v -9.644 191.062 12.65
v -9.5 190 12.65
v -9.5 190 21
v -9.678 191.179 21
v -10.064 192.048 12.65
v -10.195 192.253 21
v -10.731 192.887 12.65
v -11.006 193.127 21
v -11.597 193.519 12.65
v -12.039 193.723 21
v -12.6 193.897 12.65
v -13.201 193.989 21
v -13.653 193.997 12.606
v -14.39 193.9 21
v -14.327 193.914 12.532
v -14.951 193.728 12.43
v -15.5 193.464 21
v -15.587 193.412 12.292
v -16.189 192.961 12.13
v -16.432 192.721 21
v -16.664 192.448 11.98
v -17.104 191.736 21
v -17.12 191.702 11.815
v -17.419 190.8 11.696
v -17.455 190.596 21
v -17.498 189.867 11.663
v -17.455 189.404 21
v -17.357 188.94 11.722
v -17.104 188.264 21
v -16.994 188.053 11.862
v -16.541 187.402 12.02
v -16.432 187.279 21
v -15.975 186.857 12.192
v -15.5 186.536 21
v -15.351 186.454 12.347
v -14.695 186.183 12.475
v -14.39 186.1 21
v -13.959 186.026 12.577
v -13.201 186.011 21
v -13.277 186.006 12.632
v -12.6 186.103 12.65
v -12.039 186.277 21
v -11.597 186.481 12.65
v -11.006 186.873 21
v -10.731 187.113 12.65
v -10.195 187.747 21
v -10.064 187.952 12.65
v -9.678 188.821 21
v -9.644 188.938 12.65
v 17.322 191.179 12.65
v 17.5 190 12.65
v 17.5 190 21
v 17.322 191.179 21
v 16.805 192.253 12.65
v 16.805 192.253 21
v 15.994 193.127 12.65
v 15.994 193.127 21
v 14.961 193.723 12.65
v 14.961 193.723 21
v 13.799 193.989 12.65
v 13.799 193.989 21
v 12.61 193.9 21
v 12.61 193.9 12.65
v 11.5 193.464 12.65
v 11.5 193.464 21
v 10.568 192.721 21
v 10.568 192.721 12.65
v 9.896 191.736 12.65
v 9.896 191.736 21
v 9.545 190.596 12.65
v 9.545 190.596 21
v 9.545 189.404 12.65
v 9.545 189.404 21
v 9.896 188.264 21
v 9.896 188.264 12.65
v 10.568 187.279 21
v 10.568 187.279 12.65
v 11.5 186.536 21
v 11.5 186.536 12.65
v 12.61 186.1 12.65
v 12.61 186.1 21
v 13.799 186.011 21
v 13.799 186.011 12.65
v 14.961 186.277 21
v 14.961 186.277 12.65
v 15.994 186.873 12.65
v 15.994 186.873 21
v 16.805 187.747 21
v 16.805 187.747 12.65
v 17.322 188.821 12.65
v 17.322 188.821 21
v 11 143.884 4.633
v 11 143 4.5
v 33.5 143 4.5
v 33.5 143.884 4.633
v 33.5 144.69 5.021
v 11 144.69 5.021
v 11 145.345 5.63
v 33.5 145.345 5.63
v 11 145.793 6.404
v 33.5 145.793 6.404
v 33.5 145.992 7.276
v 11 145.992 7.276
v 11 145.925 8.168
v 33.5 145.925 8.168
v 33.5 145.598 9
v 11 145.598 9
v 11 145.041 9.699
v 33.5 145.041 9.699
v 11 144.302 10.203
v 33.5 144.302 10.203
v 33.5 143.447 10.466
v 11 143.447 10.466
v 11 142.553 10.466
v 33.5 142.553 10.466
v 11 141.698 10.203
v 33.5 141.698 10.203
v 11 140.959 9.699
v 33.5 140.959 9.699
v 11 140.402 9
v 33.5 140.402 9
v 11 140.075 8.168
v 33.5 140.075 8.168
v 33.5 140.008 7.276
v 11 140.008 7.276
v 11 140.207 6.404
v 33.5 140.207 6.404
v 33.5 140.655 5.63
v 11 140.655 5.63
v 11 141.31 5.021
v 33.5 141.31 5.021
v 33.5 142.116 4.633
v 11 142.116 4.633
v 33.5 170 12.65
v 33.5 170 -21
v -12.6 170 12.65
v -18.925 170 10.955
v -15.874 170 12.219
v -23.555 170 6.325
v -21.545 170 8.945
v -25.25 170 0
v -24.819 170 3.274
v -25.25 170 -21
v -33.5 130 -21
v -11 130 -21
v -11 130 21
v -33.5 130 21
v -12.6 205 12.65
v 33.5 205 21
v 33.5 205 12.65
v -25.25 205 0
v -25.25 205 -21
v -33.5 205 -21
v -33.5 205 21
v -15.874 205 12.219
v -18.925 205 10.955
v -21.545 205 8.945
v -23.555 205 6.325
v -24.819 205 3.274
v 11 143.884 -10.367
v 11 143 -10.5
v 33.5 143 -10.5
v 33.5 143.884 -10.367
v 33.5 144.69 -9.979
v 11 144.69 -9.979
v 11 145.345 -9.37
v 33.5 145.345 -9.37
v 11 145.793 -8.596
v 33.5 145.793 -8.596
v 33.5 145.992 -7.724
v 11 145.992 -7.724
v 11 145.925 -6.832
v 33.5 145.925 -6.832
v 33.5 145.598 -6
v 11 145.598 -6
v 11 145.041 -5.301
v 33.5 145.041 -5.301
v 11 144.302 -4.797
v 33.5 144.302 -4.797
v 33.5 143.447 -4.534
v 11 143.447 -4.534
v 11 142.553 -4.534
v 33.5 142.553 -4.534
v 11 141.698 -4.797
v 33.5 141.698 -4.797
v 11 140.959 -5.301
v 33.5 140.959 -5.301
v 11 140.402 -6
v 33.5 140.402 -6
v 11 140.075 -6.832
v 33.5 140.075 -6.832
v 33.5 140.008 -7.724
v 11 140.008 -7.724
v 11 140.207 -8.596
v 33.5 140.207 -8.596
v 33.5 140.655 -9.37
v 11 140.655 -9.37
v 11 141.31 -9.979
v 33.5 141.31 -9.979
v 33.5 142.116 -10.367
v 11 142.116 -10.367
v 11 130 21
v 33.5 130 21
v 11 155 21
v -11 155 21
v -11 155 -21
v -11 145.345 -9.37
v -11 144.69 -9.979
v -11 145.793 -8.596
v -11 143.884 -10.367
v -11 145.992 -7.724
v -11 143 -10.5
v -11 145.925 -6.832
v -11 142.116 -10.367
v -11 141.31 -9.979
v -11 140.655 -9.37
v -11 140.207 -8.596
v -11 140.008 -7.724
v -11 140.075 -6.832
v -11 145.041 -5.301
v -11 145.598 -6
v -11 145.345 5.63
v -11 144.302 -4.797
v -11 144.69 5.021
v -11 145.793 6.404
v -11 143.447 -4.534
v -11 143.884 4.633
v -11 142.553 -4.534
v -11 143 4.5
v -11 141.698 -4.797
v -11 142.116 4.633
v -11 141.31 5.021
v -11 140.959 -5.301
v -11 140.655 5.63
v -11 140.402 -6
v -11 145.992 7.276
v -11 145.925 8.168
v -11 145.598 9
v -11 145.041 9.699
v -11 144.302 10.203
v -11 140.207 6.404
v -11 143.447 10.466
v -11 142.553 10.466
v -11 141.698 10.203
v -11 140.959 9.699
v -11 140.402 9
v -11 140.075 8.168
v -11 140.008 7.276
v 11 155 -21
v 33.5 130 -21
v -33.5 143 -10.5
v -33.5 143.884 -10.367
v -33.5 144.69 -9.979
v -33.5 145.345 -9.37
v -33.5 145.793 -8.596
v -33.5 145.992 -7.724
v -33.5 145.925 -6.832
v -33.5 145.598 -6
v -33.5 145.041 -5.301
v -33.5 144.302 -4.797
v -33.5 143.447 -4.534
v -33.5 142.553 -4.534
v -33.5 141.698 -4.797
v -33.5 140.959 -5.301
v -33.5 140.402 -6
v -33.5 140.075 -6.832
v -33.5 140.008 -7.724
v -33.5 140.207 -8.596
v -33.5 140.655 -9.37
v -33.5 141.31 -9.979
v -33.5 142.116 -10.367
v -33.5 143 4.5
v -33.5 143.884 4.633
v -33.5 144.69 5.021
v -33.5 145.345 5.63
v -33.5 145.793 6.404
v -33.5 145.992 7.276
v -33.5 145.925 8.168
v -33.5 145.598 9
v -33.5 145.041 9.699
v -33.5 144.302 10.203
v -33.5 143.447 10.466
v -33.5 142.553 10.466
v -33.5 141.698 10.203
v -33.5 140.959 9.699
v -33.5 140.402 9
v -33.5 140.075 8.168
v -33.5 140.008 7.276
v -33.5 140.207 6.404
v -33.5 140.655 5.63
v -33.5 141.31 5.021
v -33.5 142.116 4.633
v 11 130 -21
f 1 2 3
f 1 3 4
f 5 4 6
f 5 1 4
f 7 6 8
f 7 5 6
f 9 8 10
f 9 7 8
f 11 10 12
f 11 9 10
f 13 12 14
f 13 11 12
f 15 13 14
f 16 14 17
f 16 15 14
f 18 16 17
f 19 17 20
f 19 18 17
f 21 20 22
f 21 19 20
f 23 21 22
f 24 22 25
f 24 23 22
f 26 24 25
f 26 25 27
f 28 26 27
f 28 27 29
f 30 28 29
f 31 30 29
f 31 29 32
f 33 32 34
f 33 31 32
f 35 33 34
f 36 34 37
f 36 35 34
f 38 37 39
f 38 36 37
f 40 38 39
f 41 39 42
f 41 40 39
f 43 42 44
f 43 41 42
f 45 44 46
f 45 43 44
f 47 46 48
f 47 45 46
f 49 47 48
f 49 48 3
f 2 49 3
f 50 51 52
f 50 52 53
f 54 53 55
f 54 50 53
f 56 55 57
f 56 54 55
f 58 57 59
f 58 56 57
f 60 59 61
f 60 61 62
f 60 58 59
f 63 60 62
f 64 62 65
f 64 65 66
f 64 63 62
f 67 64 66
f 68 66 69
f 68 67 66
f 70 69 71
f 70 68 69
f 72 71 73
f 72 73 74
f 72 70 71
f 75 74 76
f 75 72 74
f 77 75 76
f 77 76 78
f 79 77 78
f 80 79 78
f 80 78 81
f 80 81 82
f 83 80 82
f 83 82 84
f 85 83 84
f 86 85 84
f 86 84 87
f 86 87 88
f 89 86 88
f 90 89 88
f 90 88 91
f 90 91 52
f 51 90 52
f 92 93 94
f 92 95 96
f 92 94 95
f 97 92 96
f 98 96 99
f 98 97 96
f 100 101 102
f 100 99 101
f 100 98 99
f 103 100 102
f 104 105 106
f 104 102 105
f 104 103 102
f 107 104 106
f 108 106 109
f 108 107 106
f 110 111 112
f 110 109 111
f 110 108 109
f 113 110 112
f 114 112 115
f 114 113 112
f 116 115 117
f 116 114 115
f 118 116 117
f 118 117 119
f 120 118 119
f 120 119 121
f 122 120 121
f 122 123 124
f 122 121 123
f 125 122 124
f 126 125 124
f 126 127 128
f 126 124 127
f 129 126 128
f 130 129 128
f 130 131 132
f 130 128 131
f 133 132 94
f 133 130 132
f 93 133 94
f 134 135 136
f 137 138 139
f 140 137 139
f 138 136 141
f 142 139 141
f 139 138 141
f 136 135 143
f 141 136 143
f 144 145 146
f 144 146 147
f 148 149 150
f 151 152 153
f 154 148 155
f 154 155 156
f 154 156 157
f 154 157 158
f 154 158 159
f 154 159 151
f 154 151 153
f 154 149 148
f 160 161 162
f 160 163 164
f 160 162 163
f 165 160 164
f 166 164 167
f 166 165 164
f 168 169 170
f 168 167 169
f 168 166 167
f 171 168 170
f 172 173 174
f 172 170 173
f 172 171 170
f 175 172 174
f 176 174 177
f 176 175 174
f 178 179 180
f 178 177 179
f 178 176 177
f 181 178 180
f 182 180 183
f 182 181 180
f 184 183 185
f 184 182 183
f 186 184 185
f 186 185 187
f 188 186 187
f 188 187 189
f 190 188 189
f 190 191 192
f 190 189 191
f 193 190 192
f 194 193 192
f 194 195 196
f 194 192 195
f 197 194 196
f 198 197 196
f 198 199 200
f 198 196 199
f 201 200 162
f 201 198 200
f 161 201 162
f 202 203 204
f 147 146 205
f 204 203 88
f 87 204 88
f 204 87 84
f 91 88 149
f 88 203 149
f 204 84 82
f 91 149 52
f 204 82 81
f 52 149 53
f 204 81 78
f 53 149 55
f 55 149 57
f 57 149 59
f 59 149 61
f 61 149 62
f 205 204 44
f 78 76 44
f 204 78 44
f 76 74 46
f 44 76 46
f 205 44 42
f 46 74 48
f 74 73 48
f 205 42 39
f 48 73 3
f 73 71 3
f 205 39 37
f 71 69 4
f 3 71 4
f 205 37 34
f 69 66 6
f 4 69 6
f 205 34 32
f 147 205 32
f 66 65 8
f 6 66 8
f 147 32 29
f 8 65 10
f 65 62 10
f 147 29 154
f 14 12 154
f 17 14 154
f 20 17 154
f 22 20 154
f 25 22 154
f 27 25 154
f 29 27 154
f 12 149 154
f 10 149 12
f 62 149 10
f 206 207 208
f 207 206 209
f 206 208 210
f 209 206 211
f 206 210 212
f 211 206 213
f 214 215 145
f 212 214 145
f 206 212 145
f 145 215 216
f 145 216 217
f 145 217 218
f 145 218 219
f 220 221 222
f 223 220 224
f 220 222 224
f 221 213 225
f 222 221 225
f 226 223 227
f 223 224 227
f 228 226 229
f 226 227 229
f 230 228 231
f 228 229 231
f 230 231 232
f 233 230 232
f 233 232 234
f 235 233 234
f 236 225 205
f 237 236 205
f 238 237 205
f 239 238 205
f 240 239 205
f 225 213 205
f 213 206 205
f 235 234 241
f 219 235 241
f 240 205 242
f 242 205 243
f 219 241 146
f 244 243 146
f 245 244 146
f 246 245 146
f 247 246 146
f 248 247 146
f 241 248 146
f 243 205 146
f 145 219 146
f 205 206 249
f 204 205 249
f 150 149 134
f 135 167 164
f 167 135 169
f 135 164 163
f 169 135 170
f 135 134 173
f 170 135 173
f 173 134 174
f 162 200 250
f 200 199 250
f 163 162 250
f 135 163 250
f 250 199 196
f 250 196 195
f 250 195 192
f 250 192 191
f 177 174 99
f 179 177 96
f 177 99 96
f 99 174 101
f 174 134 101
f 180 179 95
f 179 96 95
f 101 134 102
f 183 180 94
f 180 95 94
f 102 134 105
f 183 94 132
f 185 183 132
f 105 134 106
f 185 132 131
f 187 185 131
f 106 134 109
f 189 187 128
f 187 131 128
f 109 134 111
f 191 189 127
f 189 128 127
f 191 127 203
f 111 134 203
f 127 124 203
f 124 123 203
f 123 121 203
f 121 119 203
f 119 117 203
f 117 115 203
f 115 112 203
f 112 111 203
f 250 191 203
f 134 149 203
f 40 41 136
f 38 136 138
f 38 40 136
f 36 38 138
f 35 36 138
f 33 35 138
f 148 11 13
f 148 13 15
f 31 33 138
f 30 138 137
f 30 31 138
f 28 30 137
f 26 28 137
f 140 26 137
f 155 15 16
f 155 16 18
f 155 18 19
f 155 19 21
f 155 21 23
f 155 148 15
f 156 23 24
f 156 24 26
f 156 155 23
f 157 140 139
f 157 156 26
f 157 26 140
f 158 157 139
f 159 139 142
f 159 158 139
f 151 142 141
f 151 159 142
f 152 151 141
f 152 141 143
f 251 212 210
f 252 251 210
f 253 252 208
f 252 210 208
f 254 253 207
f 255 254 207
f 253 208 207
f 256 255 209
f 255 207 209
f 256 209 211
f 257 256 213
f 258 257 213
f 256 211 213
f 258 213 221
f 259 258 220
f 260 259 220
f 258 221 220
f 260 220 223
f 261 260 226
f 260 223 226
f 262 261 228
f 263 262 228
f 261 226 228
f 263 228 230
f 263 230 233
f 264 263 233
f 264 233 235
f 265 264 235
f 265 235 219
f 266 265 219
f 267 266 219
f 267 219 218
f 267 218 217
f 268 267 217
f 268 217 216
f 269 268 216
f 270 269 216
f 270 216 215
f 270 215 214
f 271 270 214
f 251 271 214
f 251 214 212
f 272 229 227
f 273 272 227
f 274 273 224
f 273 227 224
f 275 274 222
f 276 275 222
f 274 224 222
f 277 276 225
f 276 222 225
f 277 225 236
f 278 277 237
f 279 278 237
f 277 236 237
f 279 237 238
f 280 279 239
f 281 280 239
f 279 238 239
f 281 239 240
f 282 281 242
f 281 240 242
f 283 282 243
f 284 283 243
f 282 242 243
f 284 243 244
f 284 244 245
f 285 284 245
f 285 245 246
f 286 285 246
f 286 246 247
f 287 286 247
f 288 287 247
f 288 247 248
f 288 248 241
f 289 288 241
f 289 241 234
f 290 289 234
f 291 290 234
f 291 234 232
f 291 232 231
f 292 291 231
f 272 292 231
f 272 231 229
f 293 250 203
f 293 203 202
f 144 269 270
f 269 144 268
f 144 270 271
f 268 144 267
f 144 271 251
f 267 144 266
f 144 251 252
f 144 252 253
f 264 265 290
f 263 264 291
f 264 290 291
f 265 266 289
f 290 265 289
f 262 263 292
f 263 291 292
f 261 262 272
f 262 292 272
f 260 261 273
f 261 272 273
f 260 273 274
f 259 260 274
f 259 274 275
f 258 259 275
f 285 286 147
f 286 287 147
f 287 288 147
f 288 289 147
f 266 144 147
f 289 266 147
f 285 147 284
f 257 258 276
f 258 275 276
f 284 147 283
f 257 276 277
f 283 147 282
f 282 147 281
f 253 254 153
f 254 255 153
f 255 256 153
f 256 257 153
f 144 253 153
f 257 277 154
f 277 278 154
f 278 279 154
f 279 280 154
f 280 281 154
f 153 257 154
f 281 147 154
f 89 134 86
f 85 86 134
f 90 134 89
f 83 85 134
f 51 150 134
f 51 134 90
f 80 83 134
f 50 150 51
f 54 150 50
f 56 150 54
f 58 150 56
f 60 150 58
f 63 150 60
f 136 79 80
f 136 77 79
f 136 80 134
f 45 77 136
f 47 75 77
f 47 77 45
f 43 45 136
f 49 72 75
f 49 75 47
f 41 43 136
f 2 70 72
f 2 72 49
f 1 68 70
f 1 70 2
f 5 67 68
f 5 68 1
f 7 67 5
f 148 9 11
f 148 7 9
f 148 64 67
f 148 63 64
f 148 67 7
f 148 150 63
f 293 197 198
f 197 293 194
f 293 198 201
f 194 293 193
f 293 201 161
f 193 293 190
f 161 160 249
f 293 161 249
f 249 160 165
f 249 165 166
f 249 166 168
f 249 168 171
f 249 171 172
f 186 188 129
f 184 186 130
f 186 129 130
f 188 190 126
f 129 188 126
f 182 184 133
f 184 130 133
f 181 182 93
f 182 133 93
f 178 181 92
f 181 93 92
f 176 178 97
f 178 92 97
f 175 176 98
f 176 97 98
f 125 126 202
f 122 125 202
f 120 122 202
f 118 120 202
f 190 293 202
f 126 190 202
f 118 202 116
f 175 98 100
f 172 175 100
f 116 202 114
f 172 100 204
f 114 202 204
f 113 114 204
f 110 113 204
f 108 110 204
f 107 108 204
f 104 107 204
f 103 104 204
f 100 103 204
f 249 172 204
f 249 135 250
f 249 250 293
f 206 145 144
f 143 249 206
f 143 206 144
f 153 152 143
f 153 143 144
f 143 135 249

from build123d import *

# Parameters (mm, degrees)
AUFSATZ_LINEAR_AUSTRAGEN1_DEPTH             = 21
AUFSATZ_LINEAR_AUSTRAGEN1_DEPTH_BACK        = 21
SCHNITT_LINEAR_AUSTRAGEN1_DEPTH             = 35
SKIZZE9_R                                   = 4
SCHNITT_LINEAR_AUSTRAGEN2_DEPTH             = 21
SCHNITT_LINEAR_AUSTRAGEN3_REACH             = 35.5
SKIZZE11_R                                  = 3
SCHNITT_LINEAR_AUSTRAGEN3_DIRECTION_2_REACH = 35.5


with BuildPart() as part:
    # Skizze3 → Aufsatz-Linear austragen1 (new body, two sides)
    with BuildSketch(Plane.XY) as aufsatz_linear_austragen1_sk:
        Polygon((0, 205), (33.5, 205), (33.5, 130), (11, 130), (11, 155), (0, 155), (-11, 155), (-11, 130), (-33.5, 130), (-33.5, 205), align=None)
    extrude(amount=AUFSATZ_LINEAR_AUSTRAGEN1_DEPTH)
    extrude(aufsatz_linear_austragen1_sk.sketch, amount=-AUFSATZ_LINEAR_AUSTRAGEN1_DEPTH_BACK)

    # Skizze6 → Schnitt-Linear austragen1 (cut)
    with BuildSketch(Plane(origin=(0, 205, 0), x_dir=(1, 0, 0), z_dir=(0, 1, 0))):
        with BuildLine():
            Line((-25.25, 0), (-25.25, 21))
            Line((-25.25, 21), (33.5, 21))
            Line((33.5, 21), (33.5, -12.65))
            Line((33.5, -12.65), (-12.6, -12.65))
            ThreePointArc((-12.6, -12.65), (-21.544900782, -8.944900782), (-25.25, 0))
        make_face()
    extrude(amount=-SCHNITT_LINEAR_AUSTRAGEN1_DEPTH, mode=Mode.SUBTRACT)

    # Skizze9 → Schnitt-Linear austragen2 (cut)
    with BuildSketch(Plane.XY):
        with Locations((-13.5, 190)):
            Circle(SKIZZE9_R)
        with Locations((13.5, 190)):
            Circle(SKIZZE9_R)
    extrude(amount=SCHNITT_LINEAR_AUSTRAGEN2_DEPTH, mode=Mode.SUBTRACT)

    # Schnitt-Linear austragen3: up to this face of the body (flat: up to its plane)
    schnitt_linear_austragen3_end = Plane(part.part.faces().sort_by_distance((-33.5, 167.5, 0))[0])
    # Skizze11 → Schnitt-Linear austragen3 (cut, up to the picked face)
    with BuildSketch(Plane(origin=(0, 0, 0), x_dir=(0, 0, -1), z_dir=(1, 0, 0)), mode=Mode.PRIVATE) as schnitt_linear_austragen3_sk1:
        with Locations((7.5, 143)):
            Circle(SKIZZE11_R)
    schnitt_linear_austragen3_tool1 = split(extrude(schnitt_linear_austragen3_sk1.sketch, amount=-SCHNITT_LINEAR_AUSTRAGEN3_REACH, mode=Mode.PRIVATE), bisect_by=schnitt_linear_austragen3_end, keep=Keep.BOTH, mode=Mode.PRIVATE)
    add(schnitt_linear_austragen3_tool1.solids().sort_by_distance((0, 143, -7.5))[0], mode=Mode.SUBTRACT)
    # Skizze11 → Schnitt-Linear austragen3 (cut, up to the picked face)
    with BuildSketch(Plane(origin=(0, 0, 0), x_dir=(0, 0, -1), z_dir=(1, 0, 0)), mode=Mode.PRIVATE) as schnitt_linear_austragen3_sk2:
        with Locations((-7.5, 143)):
            Circle(SKIZZE11_R)
    schnitt_linear_austragen3_tool2 = split(extrude(schnitt_linear_austragen3_sk2.sketch, amount=-SCHNITT_LINEAR_AUSTRAGEN3_REACH, mode=Mode.PRIVATE), bisect_by=schnitt_linear_austragen3_end, keep=Keep.BOTH, mode=Mode.PRIVATE)
    add(schnitt_linear_austragen3_tool2.solids().sort_by_distance((0, 143, 7.5))[0], mode=Mode.SUBTRACT)

    # Schnitt-Linear austragen3 direction 2: up to this face of the body (flat: up to its plane)
    schnitt_linear_austragen3_direction_2_end = Plane(part.part.faces().sort_by_distance((33.5, 155.556787933, 2.493145519))[0])
    # Skizze11 → Schnitt-Linear austragen3 direction 2 (cut, up to the picked face)
    with BuildSketch(Plane(origin=(0, 0, 0), x_dir=(0, 0, -1), z_dir=(1, 0, 0)), mode=Mode.PRIVATE) as schnitt_linear_austragen3_direction_2_sk1:
        with Locations((7.5, 143)):
            Circle(SKIZZE11_R)
    schnitt_linear_austragen3_direction_2_tool1 = split(extrude(schnitt_linear_austragen3_direction_2_sk1.sketch, amount=SCHNITT_LINEAR_AUSTRAGEN3_DIRECTION_2_REACH, mode=Mode.PRIVATE), bisect_by=schnitt_linear_austragen3_direction_2_end, keep=Keep.BOTH, mode=Mode.PRIVATE)
    add(schnitt_linear_austragen3_direction_2_tool1.solids().sort_by_distance((0, 143, -7.5))[0], mode=Mode.SUBTRACT)
    # Skizze11 → Schnitt-Linear austragen3 direction 2 (cut, up to the picked face)
    with BuildSketch(Plane(origin=(0, 0, 0), x_dir=(0, 0, -1), z_dir=(1, 0, 0)), mode=Mode.PRIVATE) as schnitt_linear_austragen3_direction_2_sk2:
        with Locations((-7.5, 143)):
            Circle(SKIZZE11_R)
    schnitt_linear_austragen3_direction_2_tool2 = split(extrude(schnitt_linear_austragen3_direction_2_sk2.sketch, amount=SCHNITT_LINEAR_AUSTRAGEN3_DIRECTION_2_REACH, mode=Mode.PRIVATE), bisect_by=schnitt_linear_austragen3_direction_2_end, keep=Keep.BOTH, mode=Mode.PRIVATE)
    add(schnitt_linear_austragen3_direction_2_tool2.solids().sort_by_distance((0, 143, 7.5))[0], mode=Mode.SUBTRACT)


solid = part.part
